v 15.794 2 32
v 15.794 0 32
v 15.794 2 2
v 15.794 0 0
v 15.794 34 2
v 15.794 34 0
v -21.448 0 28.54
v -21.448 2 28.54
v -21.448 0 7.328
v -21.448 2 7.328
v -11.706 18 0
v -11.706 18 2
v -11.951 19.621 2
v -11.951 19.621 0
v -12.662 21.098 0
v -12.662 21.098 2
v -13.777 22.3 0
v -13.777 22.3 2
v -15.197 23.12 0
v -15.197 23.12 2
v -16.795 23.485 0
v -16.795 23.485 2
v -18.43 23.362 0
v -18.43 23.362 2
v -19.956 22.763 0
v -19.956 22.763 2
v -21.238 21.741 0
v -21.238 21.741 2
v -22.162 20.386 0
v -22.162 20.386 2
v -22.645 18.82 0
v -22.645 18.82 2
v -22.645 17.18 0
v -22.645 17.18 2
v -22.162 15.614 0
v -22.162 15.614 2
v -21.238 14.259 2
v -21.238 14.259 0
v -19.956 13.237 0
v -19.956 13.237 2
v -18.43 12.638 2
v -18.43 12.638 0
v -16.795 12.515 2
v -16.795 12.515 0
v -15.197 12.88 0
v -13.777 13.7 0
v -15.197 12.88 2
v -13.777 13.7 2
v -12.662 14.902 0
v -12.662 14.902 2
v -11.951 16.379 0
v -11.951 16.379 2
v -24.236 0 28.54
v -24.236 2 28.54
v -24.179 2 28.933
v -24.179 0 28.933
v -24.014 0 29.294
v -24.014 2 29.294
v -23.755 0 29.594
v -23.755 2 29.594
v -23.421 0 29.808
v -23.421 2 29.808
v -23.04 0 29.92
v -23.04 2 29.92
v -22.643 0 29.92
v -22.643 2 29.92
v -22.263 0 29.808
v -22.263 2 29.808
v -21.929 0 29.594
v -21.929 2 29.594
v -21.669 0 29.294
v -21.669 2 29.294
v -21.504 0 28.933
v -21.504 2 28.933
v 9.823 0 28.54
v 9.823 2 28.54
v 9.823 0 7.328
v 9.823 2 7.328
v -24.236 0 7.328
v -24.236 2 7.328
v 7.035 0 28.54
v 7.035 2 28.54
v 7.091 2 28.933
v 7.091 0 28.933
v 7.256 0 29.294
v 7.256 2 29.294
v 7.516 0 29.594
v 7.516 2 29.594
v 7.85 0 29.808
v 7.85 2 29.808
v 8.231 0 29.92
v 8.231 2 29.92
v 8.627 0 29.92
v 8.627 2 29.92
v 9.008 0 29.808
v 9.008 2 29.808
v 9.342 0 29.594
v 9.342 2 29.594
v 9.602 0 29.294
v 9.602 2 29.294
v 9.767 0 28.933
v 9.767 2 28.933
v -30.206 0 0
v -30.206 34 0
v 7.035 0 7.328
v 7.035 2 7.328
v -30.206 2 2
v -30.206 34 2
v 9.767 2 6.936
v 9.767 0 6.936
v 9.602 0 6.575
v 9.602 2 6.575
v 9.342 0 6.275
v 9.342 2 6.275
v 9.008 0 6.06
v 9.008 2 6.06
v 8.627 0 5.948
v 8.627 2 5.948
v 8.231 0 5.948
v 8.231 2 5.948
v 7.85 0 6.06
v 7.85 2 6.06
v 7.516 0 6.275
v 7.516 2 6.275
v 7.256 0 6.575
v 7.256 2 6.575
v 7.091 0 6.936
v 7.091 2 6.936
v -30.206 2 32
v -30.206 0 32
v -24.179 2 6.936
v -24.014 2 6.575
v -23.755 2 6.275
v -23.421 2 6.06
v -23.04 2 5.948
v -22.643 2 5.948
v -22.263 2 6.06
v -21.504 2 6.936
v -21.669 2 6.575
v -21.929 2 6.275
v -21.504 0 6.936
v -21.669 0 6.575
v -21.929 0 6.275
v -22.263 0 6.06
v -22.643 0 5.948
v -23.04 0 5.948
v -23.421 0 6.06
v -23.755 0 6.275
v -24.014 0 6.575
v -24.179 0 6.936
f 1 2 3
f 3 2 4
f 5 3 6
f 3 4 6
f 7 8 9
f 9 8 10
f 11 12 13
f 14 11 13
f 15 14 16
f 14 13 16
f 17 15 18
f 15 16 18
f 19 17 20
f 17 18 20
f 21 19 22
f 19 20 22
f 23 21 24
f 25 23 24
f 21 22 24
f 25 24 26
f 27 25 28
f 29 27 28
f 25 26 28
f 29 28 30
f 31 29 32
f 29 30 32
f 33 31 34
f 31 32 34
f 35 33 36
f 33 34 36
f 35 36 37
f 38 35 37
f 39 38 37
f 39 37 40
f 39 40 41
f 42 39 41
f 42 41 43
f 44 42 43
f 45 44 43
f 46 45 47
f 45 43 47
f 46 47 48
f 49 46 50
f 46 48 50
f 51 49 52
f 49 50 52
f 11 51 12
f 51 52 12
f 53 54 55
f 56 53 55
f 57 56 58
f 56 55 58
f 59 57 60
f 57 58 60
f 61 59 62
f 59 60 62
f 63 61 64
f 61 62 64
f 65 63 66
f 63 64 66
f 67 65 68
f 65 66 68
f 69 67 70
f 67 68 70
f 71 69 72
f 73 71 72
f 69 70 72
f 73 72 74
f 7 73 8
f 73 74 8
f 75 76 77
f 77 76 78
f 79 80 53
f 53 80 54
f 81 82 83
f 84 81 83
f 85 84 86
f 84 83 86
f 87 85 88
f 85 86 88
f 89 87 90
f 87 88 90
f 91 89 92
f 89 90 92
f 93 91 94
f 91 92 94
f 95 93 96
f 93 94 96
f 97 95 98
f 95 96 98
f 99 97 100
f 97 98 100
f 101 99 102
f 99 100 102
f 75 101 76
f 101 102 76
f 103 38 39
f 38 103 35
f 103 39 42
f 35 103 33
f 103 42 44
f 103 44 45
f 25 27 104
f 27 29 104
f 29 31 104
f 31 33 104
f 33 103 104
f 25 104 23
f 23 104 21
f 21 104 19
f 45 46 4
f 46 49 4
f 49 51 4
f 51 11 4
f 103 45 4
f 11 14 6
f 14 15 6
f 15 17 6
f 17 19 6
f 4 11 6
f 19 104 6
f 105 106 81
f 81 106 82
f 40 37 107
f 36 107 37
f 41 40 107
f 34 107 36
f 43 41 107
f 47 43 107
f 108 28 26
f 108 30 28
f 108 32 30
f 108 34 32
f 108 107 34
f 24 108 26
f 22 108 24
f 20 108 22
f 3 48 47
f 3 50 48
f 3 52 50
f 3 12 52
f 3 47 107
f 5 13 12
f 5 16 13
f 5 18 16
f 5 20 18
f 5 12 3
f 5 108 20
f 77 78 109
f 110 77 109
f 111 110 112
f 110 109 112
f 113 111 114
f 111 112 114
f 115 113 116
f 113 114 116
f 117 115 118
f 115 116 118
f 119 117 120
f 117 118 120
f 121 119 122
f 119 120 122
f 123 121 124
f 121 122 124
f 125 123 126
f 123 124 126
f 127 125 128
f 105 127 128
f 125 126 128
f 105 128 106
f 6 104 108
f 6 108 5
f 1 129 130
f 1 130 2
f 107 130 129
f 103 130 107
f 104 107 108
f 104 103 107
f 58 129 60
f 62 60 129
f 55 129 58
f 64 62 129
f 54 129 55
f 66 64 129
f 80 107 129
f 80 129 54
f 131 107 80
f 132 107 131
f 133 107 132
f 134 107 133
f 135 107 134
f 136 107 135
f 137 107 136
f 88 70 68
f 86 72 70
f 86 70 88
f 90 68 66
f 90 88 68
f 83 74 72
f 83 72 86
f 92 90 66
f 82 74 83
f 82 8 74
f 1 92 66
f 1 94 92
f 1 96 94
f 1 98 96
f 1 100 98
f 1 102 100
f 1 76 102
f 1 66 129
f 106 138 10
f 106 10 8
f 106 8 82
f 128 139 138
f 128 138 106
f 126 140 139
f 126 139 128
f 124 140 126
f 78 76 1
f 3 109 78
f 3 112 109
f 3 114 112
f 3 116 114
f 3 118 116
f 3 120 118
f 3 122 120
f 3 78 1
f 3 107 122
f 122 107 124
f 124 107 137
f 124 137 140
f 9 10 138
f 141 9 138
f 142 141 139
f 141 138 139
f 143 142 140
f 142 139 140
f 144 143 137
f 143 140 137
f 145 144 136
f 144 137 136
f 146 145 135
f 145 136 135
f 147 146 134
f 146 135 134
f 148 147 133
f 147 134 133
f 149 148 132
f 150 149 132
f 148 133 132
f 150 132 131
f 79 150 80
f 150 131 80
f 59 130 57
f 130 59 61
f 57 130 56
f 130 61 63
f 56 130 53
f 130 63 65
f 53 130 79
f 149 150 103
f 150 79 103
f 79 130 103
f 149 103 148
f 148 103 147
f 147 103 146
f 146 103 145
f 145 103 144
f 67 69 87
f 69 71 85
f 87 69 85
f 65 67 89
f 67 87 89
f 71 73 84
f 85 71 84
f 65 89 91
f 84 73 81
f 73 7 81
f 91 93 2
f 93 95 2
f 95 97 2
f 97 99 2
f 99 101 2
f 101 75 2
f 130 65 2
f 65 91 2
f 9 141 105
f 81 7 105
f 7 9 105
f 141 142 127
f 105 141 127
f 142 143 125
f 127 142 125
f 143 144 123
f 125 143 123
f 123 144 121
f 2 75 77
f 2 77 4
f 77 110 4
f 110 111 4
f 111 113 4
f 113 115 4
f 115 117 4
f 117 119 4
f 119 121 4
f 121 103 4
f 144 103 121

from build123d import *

# Parameters (mm, degrees)
SKETCH_1_W          = 46
SKETCH_1_H          = 34
EXTRUDE_1_DEPTH     = 2
SKETCH_2_W          = 46
SKETCH_2_H          = 2
EXTRUDE_2_DEPTH     = 30
SKETCH_3_R          = 5.5
CUT_EXTRUDE_1_DEPTH = 2
CUT_EXTRUDE_2_DEPTH = 2


with BuildPart() as part:
    # 草图1 → 凸台-拉伸1 (new body)
    with BuildSketch(Plane.XY):
        with Locations((-7.206275861, 17)):
            Rectangle(SKETCH_1_W, SKETCH_1_H)
    extrude(amount=EXTRUDE_1_DEPTH)

    # 草图2 → 凸台-拉伸2 (add)
    with BuildSketch(Plane.XY.offset(2)):
        with Locations((-7.206275861, 1)):
            Rectangle(SKETCH_2_W, SKETCH_2_H)
    extrude(amount=EXTRUDE_2_DEPTH)

    # 草图3 → 切除-拉伸1 (cut)
    with BuildSketch(Plane.XY.offset(2)):
        with Locations((-17.206275861, 18)):
            Circle(SKETCH_3_R)
    extrude(amount=-CUT_EXTRUDE_1_DEPTH, mode=Mode.SUBTRACT)

    # 草图4 → 切除-拉伸2 (cut)
    with BuildSketch(Plane(origin=(0, 2, 0), x_dir=(1, 0, 0), z_dir=(0, 1, 0))):
        with BuildLine():
            Line((-24.235699599, -7.328343443), (-24.235699599, -28.539953108))
            ThreePointArc((-24.235699599, -28.539953108), (-22.841637624, -29.934015083), (-21.447575649, -28.539953108))
            Line((-21.447575649, -28.539953108), (-21.447575649, -7.328343443))
            ThreePointArc((-21.447575649, -7.328343443), (-22.841637624, -5.934281468), (-24.235699599, -7.328343443))
        make_face()
        with BuildLine():
            Line((7.035023927, -7.328343443), (7.035023927, -28.539953108))
            ThreePointArc((7.035023927, -28.539953108), (8.429085903, -29.934015083), (9.823147878, -28.539953108))
            Line((9.823147878, -28.539953108), (9.823147878, -7.328343443))
            ThreePointArc((9.823147878, -7.328343443), (8.429085903, -5.934281468), (7.035023927, -7.328343443))
        make_face()
    extrude(amount=-CUT_EXTRUDE_2_DEPTH, mode=Mode.SUBTRACT)


solid = part.part
